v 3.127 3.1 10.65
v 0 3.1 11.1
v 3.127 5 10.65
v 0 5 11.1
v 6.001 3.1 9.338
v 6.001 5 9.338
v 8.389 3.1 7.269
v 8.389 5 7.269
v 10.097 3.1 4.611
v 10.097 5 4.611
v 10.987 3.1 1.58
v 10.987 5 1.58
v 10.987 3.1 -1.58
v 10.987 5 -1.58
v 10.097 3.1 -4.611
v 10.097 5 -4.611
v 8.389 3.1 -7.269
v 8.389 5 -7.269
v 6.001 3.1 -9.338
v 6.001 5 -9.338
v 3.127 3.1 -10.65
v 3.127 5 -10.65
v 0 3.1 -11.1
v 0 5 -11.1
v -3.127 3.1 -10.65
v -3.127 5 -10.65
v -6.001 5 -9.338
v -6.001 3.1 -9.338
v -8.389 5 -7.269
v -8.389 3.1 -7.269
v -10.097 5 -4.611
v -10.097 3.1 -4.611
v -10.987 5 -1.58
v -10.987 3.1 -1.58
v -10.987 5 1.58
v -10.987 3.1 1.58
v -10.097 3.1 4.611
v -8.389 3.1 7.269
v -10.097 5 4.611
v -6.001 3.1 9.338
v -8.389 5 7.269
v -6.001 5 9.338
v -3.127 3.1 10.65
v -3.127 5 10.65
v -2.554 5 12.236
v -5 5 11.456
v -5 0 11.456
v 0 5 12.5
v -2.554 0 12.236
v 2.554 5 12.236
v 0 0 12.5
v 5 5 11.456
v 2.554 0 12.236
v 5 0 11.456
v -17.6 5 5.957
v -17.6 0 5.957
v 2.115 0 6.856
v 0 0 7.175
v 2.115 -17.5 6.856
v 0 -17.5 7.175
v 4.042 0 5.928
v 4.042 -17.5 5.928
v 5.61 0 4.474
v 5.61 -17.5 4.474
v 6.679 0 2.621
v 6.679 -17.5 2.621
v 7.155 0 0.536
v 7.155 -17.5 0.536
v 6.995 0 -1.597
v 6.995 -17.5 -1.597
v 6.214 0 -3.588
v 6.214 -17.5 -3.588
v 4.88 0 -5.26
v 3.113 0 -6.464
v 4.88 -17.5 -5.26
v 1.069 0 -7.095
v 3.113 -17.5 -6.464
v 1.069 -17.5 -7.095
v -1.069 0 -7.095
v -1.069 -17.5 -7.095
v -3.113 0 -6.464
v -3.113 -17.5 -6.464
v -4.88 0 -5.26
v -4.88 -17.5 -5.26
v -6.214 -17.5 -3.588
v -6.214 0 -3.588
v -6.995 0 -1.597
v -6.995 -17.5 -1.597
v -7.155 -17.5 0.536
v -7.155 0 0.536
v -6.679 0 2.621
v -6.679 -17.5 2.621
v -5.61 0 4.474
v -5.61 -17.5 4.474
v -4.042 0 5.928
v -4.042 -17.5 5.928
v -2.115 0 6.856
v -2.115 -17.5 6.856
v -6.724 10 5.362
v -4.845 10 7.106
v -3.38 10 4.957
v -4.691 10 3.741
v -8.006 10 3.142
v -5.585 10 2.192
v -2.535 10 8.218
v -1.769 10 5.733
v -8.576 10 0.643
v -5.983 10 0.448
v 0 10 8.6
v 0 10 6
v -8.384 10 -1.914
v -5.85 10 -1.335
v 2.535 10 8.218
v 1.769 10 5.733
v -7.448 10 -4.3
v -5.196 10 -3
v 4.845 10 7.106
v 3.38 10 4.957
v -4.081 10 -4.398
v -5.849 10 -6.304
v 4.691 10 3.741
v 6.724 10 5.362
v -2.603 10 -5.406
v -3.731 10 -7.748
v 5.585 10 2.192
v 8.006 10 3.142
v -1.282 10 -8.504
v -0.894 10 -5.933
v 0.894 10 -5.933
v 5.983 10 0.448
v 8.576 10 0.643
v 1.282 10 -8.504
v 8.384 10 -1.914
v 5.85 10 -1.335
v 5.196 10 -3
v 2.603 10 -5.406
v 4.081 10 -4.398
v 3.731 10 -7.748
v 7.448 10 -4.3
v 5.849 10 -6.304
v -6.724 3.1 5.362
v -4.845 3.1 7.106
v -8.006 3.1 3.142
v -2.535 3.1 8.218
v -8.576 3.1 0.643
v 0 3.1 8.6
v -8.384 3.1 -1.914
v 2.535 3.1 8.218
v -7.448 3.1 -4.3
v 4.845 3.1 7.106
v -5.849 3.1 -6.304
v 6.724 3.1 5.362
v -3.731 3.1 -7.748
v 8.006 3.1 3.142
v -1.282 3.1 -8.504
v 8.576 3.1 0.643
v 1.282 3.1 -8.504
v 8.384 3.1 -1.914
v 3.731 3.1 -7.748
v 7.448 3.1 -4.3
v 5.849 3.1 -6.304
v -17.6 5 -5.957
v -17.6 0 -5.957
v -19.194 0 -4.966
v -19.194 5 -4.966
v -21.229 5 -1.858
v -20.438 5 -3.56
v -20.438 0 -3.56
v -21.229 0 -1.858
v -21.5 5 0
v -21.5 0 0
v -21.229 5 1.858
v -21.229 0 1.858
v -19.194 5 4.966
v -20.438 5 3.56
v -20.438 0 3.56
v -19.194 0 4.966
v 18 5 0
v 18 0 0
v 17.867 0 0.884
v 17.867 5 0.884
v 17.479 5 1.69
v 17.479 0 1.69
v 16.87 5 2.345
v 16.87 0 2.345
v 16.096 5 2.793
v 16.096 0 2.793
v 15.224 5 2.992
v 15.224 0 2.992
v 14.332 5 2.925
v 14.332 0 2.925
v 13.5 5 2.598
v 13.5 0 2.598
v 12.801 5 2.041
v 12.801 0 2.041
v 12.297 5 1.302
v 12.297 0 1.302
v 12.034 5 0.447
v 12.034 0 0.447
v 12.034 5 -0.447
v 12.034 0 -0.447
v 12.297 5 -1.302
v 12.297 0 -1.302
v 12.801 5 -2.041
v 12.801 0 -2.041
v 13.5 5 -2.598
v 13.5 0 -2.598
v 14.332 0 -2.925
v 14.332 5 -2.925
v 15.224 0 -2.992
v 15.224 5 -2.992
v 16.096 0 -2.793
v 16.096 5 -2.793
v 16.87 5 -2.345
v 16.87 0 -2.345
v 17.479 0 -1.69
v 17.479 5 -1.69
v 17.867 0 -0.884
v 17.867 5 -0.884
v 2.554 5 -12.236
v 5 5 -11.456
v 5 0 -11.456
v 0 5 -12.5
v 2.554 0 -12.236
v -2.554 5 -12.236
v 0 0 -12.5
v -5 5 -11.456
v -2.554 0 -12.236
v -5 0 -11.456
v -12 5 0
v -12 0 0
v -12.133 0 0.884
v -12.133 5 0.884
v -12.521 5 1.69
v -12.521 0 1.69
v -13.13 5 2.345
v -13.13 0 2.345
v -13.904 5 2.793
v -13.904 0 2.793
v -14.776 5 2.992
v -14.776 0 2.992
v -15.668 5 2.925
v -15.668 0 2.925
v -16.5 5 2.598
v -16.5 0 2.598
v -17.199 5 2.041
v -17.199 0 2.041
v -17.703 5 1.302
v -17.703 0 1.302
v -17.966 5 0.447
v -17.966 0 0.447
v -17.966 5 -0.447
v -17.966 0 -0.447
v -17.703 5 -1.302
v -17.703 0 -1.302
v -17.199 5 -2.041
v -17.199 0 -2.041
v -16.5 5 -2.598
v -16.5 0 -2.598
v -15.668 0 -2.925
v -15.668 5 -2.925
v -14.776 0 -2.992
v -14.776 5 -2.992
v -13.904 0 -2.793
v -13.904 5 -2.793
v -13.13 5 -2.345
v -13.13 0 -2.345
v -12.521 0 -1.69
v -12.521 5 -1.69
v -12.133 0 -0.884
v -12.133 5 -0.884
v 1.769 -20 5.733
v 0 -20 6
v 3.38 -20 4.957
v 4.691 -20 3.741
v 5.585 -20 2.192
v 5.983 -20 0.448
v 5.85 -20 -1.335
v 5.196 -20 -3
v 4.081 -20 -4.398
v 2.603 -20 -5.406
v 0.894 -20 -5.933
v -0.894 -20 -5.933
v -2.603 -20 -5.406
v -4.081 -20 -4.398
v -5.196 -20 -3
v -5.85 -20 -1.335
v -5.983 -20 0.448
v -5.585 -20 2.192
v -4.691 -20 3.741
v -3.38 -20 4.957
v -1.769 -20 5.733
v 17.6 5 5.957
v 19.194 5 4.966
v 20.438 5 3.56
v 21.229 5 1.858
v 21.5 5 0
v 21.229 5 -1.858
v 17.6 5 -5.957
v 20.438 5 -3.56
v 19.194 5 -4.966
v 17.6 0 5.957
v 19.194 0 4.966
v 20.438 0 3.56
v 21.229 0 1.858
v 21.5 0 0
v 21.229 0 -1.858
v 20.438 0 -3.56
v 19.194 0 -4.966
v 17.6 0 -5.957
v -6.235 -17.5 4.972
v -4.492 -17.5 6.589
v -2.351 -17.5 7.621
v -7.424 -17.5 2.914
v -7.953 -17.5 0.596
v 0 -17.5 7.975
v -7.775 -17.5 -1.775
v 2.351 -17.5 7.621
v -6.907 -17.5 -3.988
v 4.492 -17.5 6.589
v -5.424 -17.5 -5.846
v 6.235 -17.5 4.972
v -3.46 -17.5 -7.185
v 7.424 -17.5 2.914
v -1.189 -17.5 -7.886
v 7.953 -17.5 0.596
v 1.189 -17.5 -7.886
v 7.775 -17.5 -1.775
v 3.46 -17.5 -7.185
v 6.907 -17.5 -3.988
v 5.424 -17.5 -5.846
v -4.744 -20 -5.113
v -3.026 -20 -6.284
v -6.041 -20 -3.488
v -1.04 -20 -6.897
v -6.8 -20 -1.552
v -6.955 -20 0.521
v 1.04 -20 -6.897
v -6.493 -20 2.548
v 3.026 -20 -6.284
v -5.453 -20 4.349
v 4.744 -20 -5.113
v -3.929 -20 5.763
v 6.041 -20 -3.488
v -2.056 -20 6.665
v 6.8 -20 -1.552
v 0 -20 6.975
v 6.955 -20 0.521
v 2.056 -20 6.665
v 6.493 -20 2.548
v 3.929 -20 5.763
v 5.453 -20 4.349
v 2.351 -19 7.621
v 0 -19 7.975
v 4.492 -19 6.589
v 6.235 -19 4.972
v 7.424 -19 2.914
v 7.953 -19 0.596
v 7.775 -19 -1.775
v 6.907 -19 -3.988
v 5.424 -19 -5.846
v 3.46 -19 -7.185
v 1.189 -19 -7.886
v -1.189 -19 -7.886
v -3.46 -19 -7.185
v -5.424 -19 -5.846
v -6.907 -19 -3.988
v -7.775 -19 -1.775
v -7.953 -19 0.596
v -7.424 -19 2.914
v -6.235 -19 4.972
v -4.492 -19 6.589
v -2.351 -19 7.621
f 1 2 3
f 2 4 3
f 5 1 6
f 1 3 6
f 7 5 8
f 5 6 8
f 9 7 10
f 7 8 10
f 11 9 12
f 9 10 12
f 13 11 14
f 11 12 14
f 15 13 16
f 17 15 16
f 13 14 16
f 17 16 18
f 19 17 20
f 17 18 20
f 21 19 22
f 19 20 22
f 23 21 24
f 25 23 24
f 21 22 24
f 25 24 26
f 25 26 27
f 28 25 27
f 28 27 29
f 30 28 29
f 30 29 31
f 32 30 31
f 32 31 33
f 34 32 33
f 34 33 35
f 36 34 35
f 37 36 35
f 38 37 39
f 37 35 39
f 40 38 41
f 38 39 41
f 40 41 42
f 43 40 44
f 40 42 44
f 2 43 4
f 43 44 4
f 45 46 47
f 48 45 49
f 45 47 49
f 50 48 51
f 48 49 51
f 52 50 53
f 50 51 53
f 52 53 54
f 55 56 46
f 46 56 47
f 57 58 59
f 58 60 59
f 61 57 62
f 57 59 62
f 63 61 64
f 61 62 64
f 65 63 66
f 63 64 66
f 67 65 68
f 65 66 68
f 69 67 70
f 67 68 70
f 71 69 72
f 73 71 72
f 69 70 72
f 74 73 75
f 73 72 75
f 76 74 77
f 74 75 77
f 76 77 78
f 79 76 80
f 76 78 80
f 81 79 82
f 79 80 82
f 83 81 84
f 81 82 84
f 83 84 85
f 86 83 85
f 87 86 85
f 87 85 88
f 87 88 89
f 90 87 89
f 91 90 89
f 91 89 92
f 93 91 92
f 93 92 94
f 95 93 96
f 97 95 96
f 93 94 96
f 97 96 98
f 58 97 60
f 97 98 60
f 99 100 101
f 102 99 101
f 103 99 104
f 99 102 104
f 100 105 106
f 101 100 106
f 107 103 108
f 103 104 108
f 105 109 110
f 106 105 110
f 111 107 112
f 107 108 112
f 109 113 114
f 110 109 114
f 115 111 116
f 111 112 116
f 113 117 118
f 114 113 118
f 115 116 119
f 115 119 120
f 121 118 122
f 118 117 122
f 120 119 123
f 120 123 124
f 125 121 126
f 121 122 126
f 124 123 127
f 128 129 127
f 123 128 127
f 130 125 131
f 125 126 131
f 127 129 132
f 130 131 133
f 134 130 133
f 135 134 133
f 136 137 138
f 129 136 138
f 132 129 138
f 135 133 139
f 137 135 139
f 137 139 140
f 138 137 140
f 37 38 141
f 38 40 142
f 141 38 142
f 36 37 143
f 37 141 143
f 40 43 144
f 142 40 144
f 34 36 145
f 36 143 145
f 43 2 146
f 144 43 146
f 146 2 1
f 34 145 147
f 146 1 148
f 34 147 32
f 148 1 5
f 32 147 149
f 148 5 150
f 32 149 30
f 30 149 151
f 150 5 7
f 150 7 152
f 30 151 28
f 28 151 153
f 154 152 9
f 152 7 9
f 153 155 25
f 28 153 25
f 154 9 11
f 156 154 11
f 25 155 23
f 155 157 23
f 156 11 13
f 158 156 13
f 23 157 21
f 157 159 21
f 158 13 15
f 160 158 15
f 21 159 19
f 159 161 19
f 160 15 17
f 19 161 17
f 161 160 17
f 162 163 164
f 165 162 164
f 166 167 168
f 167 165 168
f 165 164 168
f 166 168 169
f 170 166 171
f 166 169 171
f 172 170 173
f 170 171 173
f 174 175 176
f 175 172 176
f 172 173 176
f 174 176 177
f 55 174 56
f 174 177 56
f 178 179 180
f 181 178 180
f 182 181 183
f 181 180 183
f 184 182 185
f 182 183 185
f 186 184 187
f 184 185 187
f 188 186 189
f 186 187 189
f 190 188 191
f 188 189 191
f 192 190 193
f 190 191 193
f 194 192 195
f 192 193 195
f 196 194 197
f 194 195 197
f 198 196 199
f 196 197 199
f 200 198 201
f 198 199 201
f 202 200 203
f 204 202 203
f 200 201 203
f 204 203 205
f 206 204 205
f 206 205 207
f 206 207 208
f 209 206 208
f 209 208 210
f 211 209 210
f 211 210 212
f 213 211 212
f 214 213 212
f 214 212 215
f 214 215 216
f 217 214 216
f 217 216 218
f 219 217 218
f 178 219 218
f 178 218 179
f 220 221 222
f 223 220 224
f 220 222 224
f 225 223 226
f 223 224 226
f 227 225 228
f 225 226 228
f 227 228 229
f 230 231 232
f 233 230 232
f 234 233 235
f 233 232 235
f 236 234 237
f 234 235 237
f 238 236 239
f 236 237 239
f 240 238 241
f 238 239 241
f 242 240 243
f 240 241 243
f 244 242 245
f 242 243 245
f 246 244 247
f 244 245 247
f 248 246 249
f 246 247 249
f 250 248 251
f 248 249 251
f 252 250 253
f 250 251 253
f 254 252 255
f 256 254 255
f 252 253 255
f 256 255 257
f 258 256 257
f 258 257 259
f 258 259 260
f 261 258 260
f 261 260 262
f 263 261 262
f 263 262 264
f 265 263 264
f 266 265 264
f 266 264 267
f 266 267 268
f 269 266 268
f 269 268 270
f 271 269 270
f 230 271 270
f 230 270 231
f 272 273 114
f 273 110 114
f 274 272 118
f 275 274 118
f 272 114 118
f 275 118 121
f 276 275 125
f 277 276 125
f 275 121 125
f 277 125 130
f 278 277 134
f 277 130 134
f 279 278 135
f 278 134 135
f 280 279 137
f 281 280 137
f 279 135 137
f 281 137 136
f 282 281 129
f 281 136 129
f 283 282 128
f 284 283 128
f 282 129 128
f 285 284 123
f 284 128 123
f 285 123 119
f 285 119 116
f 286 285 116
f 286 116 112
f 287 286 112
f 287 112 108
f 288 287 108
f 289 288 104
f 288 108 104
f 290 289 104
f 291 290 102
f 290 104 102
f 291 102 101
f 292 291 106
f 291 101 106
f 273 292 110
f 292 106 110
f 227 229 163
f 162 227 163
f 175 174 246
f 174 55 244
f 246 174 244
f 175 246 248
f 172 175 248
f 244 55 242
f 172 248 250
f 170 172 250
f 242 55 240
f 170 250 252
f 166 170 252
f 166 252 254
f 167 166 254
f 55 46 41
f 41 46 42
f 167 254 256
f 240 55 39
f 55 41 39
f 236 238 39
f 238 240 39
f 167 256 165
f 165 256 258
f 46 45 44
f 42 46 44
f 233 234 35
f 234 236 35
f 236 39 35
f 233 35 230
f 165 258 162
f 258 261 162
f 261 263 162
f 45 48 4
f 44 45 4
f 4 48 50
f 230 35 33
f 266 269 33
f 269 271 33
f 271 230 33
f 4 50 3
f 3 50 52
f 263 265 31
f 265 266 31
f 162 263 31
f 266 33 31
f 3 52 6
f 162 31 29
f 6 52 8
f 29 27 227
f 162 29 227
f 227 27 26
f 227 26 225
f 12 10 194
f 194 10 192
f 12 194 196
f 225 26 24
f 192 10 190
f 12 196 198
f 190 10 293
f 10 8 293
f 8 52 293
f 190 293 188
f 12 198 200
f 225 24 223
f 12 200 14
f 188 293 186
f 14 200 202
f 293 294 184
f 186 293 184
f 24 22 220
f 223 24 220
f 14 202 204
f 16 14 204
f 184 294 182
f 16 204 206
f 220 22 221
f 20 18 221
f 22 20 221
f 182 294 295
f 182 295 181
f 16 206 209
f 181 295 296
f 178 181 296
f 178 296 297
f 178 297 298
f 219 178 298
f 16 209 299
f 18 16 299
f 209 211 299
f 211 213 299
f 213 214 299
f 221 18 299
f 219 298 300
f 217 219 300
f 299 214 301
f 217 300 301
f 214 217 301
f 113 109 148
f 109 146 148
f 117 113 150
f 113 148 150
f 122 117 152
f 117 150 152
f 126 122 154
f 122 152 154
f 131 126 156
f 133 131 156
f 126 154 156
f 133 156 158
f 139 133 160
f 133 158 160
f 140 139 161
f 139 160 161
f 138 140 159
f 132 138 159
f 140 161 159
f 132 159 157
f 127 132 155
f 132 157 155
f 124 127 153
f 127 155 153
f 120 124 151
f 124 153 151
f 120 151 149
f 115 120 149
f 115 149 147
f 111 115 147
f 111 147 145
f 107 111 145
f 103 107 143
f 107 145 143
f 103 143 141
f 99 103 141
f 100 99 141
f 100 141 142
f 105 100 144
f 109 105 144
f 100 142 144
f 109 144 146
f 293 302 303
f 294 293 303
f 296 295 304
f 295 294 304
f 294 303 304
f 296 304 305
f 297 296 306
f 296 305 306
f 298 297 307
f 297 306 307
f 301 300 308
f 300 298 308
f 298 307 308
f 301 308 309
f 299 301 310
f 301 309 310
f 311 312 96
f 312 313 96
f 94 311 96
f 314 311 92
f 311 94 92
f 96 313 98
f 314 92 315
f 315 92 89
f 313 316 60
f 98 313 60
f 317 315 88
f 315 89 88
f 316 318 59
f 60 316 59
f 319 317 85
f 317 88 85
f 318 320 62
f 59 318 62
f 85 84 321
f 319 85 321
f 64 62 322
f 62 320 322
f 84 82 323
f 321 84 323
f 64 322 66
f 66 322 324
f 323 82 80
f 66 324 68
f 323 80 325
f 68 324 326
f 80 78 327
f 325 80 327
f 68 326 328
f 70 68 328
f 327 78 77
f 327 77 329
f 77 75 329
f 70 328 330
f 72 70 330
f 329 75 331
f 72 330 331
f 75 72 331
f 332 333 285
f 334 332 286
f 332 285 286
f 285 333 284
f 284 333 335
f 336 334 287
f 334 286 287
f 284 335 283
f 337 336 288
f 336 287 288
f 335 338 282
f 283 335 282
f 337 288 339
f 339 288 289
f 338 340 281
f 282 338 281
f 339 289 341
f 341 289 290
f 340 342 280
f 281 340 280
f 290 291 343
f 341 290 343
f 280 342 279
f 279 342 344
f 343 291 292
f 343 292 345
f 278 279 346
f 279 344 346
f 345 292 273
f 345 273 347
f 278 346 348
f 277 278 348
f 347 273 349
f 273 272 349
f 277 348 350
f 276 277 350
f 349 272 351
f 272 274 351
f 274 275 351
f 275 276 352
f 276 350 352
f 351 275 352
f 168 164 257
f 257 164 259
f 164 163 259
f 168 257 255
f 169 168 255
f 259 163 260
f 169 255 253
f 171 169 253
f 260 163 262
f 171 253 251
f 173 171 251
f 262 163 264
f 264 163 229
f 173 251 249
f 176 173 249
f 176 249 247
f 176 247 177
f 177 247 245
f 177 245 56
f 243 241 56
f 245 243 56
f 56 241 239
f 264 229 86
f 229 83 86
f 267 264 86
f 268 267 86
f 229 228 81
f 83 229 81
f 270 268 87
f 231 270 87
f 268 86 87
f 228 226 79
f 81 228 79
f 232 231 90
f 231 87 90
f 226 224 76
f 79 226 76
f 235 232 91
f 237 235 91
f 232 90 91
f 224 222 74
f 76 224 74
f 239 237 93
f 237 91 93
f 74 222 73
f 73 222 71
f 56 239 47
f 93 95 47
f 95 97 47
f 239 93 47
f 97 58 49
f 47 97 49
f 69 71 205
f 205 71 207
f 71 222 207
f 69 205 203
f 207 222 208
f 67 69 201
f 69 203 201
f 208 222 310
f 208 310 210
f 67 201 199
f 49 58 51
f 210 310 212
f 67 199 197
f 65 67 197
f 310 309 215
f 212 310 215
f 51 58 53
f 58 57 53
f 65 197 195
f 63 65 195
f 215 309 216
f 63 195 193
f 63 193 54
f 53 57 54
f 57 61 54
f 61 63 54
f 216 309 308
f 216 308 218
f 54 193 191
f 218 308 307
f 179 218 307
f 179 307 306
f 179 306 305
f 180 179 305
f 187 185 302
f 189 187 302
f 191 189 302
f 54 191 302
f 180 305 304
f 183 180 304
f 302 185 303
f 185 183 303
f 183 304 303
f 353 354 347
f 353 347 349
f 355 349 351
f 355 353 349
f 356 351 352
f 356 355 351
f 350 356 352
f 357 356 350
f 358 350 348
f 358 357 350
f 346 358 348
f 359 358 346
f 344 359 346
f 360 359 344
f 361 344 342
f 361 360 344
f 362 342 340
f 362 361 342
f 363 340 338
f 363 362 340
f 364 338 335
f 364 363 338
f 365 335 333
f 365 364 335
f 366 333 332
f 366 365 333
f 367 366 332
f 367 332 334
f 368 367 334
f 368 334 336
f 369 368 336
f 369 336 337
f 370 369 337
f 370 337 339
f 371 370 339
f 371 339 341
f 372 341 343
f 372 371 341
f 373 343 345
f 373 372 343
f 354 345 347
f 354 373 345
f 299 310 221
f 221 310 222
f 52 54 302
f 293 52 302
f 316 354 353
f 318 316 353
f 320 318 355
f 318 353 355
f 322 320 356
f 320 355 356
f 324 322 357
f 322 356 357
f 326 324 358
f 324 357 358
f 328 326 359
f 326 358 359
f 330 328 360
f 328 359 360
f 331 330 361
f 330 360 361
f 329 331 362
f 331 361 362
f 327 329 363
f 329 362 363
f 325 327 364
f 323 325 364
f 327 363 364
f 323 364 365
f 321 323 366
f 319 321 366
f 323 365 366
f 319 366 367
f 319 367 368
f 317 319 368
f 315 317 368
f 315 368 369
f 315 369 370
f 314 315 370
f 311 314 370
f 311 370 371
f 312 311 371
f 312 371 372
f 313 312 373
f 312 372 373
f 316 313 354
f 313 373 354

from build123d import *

# Parameters (mm, degrees)
F2_SIZE  = 1
F3_R     = 30
F4_DEPTH = 25
F3_R_2   = 3
F5_DEPTH = 25


with BuildPart() as f1:
    # F0 (on Right) → F1 (revolve)
    with BuildSketch(Plane.YZ):
        Polygon((-20, 7.975), (-20, 6), (10, 6), (10, 8.6), (3.1, 8.6), (3.1, 11.1), (5, 11.1), (5, 21.5), (0, 21.5), (0, 7.175), (-17.5, 7.175), (-17.5, 7.975), align=None)
    revolve(axis=Axis((0, -4.153569, 0), (0, 1, 0)))

    # F2
    f2_edges = [f1.edges().sort_by_distance(p)[0] for p in [
        (0, -20, -7.975),
    ]]
    chamfer(f2_edges, length=F2_SIZE)

    # F3 (on face) → F4 (cut)
    with BuildSketch(Plane.XZ):
        Circle(F3_R)
        with BuildLine():
            ThreePointArc((-17.6, -5.957348), (-21.5, 0), (-17.6, 5.957348))
            Line((-17.6, 5.957348), (-5, 11.456439))
            ThreePointArc((-5, 11.456439), (0, 12.5), (5, 11.456439))
            Line((5, 11.456439), (17.6, 5.957348))
            ThreePointArc((17.6, 5.957348), (21.5, 0), (17.6, -5.957348))
            Line((17.6, -5.957348), (5, -11.456439))
            ThreePointArc((5, -11.456439), (0, -12.5), (-5, -11.456439))
            Line((-5, -11.456439), (-17.6, -5.957348))
        make_face(mode=Mode.SUBTRACT)
    extrude(amount=-F4_DEPTH, mode=Mode.SUBTRACT)

    # F3 (on face) → F5 (cut)
    with BuildSketch(Plane.XZ):
        with Locations((15, 0)):
            Circle(F3_R_2)
        with Locations((-15, 0)):
            Circle(F3_R_2)
    extrude(amount=-F5_DEPTH, mode=Mode.SUBTRACT)


solid = f1.part
